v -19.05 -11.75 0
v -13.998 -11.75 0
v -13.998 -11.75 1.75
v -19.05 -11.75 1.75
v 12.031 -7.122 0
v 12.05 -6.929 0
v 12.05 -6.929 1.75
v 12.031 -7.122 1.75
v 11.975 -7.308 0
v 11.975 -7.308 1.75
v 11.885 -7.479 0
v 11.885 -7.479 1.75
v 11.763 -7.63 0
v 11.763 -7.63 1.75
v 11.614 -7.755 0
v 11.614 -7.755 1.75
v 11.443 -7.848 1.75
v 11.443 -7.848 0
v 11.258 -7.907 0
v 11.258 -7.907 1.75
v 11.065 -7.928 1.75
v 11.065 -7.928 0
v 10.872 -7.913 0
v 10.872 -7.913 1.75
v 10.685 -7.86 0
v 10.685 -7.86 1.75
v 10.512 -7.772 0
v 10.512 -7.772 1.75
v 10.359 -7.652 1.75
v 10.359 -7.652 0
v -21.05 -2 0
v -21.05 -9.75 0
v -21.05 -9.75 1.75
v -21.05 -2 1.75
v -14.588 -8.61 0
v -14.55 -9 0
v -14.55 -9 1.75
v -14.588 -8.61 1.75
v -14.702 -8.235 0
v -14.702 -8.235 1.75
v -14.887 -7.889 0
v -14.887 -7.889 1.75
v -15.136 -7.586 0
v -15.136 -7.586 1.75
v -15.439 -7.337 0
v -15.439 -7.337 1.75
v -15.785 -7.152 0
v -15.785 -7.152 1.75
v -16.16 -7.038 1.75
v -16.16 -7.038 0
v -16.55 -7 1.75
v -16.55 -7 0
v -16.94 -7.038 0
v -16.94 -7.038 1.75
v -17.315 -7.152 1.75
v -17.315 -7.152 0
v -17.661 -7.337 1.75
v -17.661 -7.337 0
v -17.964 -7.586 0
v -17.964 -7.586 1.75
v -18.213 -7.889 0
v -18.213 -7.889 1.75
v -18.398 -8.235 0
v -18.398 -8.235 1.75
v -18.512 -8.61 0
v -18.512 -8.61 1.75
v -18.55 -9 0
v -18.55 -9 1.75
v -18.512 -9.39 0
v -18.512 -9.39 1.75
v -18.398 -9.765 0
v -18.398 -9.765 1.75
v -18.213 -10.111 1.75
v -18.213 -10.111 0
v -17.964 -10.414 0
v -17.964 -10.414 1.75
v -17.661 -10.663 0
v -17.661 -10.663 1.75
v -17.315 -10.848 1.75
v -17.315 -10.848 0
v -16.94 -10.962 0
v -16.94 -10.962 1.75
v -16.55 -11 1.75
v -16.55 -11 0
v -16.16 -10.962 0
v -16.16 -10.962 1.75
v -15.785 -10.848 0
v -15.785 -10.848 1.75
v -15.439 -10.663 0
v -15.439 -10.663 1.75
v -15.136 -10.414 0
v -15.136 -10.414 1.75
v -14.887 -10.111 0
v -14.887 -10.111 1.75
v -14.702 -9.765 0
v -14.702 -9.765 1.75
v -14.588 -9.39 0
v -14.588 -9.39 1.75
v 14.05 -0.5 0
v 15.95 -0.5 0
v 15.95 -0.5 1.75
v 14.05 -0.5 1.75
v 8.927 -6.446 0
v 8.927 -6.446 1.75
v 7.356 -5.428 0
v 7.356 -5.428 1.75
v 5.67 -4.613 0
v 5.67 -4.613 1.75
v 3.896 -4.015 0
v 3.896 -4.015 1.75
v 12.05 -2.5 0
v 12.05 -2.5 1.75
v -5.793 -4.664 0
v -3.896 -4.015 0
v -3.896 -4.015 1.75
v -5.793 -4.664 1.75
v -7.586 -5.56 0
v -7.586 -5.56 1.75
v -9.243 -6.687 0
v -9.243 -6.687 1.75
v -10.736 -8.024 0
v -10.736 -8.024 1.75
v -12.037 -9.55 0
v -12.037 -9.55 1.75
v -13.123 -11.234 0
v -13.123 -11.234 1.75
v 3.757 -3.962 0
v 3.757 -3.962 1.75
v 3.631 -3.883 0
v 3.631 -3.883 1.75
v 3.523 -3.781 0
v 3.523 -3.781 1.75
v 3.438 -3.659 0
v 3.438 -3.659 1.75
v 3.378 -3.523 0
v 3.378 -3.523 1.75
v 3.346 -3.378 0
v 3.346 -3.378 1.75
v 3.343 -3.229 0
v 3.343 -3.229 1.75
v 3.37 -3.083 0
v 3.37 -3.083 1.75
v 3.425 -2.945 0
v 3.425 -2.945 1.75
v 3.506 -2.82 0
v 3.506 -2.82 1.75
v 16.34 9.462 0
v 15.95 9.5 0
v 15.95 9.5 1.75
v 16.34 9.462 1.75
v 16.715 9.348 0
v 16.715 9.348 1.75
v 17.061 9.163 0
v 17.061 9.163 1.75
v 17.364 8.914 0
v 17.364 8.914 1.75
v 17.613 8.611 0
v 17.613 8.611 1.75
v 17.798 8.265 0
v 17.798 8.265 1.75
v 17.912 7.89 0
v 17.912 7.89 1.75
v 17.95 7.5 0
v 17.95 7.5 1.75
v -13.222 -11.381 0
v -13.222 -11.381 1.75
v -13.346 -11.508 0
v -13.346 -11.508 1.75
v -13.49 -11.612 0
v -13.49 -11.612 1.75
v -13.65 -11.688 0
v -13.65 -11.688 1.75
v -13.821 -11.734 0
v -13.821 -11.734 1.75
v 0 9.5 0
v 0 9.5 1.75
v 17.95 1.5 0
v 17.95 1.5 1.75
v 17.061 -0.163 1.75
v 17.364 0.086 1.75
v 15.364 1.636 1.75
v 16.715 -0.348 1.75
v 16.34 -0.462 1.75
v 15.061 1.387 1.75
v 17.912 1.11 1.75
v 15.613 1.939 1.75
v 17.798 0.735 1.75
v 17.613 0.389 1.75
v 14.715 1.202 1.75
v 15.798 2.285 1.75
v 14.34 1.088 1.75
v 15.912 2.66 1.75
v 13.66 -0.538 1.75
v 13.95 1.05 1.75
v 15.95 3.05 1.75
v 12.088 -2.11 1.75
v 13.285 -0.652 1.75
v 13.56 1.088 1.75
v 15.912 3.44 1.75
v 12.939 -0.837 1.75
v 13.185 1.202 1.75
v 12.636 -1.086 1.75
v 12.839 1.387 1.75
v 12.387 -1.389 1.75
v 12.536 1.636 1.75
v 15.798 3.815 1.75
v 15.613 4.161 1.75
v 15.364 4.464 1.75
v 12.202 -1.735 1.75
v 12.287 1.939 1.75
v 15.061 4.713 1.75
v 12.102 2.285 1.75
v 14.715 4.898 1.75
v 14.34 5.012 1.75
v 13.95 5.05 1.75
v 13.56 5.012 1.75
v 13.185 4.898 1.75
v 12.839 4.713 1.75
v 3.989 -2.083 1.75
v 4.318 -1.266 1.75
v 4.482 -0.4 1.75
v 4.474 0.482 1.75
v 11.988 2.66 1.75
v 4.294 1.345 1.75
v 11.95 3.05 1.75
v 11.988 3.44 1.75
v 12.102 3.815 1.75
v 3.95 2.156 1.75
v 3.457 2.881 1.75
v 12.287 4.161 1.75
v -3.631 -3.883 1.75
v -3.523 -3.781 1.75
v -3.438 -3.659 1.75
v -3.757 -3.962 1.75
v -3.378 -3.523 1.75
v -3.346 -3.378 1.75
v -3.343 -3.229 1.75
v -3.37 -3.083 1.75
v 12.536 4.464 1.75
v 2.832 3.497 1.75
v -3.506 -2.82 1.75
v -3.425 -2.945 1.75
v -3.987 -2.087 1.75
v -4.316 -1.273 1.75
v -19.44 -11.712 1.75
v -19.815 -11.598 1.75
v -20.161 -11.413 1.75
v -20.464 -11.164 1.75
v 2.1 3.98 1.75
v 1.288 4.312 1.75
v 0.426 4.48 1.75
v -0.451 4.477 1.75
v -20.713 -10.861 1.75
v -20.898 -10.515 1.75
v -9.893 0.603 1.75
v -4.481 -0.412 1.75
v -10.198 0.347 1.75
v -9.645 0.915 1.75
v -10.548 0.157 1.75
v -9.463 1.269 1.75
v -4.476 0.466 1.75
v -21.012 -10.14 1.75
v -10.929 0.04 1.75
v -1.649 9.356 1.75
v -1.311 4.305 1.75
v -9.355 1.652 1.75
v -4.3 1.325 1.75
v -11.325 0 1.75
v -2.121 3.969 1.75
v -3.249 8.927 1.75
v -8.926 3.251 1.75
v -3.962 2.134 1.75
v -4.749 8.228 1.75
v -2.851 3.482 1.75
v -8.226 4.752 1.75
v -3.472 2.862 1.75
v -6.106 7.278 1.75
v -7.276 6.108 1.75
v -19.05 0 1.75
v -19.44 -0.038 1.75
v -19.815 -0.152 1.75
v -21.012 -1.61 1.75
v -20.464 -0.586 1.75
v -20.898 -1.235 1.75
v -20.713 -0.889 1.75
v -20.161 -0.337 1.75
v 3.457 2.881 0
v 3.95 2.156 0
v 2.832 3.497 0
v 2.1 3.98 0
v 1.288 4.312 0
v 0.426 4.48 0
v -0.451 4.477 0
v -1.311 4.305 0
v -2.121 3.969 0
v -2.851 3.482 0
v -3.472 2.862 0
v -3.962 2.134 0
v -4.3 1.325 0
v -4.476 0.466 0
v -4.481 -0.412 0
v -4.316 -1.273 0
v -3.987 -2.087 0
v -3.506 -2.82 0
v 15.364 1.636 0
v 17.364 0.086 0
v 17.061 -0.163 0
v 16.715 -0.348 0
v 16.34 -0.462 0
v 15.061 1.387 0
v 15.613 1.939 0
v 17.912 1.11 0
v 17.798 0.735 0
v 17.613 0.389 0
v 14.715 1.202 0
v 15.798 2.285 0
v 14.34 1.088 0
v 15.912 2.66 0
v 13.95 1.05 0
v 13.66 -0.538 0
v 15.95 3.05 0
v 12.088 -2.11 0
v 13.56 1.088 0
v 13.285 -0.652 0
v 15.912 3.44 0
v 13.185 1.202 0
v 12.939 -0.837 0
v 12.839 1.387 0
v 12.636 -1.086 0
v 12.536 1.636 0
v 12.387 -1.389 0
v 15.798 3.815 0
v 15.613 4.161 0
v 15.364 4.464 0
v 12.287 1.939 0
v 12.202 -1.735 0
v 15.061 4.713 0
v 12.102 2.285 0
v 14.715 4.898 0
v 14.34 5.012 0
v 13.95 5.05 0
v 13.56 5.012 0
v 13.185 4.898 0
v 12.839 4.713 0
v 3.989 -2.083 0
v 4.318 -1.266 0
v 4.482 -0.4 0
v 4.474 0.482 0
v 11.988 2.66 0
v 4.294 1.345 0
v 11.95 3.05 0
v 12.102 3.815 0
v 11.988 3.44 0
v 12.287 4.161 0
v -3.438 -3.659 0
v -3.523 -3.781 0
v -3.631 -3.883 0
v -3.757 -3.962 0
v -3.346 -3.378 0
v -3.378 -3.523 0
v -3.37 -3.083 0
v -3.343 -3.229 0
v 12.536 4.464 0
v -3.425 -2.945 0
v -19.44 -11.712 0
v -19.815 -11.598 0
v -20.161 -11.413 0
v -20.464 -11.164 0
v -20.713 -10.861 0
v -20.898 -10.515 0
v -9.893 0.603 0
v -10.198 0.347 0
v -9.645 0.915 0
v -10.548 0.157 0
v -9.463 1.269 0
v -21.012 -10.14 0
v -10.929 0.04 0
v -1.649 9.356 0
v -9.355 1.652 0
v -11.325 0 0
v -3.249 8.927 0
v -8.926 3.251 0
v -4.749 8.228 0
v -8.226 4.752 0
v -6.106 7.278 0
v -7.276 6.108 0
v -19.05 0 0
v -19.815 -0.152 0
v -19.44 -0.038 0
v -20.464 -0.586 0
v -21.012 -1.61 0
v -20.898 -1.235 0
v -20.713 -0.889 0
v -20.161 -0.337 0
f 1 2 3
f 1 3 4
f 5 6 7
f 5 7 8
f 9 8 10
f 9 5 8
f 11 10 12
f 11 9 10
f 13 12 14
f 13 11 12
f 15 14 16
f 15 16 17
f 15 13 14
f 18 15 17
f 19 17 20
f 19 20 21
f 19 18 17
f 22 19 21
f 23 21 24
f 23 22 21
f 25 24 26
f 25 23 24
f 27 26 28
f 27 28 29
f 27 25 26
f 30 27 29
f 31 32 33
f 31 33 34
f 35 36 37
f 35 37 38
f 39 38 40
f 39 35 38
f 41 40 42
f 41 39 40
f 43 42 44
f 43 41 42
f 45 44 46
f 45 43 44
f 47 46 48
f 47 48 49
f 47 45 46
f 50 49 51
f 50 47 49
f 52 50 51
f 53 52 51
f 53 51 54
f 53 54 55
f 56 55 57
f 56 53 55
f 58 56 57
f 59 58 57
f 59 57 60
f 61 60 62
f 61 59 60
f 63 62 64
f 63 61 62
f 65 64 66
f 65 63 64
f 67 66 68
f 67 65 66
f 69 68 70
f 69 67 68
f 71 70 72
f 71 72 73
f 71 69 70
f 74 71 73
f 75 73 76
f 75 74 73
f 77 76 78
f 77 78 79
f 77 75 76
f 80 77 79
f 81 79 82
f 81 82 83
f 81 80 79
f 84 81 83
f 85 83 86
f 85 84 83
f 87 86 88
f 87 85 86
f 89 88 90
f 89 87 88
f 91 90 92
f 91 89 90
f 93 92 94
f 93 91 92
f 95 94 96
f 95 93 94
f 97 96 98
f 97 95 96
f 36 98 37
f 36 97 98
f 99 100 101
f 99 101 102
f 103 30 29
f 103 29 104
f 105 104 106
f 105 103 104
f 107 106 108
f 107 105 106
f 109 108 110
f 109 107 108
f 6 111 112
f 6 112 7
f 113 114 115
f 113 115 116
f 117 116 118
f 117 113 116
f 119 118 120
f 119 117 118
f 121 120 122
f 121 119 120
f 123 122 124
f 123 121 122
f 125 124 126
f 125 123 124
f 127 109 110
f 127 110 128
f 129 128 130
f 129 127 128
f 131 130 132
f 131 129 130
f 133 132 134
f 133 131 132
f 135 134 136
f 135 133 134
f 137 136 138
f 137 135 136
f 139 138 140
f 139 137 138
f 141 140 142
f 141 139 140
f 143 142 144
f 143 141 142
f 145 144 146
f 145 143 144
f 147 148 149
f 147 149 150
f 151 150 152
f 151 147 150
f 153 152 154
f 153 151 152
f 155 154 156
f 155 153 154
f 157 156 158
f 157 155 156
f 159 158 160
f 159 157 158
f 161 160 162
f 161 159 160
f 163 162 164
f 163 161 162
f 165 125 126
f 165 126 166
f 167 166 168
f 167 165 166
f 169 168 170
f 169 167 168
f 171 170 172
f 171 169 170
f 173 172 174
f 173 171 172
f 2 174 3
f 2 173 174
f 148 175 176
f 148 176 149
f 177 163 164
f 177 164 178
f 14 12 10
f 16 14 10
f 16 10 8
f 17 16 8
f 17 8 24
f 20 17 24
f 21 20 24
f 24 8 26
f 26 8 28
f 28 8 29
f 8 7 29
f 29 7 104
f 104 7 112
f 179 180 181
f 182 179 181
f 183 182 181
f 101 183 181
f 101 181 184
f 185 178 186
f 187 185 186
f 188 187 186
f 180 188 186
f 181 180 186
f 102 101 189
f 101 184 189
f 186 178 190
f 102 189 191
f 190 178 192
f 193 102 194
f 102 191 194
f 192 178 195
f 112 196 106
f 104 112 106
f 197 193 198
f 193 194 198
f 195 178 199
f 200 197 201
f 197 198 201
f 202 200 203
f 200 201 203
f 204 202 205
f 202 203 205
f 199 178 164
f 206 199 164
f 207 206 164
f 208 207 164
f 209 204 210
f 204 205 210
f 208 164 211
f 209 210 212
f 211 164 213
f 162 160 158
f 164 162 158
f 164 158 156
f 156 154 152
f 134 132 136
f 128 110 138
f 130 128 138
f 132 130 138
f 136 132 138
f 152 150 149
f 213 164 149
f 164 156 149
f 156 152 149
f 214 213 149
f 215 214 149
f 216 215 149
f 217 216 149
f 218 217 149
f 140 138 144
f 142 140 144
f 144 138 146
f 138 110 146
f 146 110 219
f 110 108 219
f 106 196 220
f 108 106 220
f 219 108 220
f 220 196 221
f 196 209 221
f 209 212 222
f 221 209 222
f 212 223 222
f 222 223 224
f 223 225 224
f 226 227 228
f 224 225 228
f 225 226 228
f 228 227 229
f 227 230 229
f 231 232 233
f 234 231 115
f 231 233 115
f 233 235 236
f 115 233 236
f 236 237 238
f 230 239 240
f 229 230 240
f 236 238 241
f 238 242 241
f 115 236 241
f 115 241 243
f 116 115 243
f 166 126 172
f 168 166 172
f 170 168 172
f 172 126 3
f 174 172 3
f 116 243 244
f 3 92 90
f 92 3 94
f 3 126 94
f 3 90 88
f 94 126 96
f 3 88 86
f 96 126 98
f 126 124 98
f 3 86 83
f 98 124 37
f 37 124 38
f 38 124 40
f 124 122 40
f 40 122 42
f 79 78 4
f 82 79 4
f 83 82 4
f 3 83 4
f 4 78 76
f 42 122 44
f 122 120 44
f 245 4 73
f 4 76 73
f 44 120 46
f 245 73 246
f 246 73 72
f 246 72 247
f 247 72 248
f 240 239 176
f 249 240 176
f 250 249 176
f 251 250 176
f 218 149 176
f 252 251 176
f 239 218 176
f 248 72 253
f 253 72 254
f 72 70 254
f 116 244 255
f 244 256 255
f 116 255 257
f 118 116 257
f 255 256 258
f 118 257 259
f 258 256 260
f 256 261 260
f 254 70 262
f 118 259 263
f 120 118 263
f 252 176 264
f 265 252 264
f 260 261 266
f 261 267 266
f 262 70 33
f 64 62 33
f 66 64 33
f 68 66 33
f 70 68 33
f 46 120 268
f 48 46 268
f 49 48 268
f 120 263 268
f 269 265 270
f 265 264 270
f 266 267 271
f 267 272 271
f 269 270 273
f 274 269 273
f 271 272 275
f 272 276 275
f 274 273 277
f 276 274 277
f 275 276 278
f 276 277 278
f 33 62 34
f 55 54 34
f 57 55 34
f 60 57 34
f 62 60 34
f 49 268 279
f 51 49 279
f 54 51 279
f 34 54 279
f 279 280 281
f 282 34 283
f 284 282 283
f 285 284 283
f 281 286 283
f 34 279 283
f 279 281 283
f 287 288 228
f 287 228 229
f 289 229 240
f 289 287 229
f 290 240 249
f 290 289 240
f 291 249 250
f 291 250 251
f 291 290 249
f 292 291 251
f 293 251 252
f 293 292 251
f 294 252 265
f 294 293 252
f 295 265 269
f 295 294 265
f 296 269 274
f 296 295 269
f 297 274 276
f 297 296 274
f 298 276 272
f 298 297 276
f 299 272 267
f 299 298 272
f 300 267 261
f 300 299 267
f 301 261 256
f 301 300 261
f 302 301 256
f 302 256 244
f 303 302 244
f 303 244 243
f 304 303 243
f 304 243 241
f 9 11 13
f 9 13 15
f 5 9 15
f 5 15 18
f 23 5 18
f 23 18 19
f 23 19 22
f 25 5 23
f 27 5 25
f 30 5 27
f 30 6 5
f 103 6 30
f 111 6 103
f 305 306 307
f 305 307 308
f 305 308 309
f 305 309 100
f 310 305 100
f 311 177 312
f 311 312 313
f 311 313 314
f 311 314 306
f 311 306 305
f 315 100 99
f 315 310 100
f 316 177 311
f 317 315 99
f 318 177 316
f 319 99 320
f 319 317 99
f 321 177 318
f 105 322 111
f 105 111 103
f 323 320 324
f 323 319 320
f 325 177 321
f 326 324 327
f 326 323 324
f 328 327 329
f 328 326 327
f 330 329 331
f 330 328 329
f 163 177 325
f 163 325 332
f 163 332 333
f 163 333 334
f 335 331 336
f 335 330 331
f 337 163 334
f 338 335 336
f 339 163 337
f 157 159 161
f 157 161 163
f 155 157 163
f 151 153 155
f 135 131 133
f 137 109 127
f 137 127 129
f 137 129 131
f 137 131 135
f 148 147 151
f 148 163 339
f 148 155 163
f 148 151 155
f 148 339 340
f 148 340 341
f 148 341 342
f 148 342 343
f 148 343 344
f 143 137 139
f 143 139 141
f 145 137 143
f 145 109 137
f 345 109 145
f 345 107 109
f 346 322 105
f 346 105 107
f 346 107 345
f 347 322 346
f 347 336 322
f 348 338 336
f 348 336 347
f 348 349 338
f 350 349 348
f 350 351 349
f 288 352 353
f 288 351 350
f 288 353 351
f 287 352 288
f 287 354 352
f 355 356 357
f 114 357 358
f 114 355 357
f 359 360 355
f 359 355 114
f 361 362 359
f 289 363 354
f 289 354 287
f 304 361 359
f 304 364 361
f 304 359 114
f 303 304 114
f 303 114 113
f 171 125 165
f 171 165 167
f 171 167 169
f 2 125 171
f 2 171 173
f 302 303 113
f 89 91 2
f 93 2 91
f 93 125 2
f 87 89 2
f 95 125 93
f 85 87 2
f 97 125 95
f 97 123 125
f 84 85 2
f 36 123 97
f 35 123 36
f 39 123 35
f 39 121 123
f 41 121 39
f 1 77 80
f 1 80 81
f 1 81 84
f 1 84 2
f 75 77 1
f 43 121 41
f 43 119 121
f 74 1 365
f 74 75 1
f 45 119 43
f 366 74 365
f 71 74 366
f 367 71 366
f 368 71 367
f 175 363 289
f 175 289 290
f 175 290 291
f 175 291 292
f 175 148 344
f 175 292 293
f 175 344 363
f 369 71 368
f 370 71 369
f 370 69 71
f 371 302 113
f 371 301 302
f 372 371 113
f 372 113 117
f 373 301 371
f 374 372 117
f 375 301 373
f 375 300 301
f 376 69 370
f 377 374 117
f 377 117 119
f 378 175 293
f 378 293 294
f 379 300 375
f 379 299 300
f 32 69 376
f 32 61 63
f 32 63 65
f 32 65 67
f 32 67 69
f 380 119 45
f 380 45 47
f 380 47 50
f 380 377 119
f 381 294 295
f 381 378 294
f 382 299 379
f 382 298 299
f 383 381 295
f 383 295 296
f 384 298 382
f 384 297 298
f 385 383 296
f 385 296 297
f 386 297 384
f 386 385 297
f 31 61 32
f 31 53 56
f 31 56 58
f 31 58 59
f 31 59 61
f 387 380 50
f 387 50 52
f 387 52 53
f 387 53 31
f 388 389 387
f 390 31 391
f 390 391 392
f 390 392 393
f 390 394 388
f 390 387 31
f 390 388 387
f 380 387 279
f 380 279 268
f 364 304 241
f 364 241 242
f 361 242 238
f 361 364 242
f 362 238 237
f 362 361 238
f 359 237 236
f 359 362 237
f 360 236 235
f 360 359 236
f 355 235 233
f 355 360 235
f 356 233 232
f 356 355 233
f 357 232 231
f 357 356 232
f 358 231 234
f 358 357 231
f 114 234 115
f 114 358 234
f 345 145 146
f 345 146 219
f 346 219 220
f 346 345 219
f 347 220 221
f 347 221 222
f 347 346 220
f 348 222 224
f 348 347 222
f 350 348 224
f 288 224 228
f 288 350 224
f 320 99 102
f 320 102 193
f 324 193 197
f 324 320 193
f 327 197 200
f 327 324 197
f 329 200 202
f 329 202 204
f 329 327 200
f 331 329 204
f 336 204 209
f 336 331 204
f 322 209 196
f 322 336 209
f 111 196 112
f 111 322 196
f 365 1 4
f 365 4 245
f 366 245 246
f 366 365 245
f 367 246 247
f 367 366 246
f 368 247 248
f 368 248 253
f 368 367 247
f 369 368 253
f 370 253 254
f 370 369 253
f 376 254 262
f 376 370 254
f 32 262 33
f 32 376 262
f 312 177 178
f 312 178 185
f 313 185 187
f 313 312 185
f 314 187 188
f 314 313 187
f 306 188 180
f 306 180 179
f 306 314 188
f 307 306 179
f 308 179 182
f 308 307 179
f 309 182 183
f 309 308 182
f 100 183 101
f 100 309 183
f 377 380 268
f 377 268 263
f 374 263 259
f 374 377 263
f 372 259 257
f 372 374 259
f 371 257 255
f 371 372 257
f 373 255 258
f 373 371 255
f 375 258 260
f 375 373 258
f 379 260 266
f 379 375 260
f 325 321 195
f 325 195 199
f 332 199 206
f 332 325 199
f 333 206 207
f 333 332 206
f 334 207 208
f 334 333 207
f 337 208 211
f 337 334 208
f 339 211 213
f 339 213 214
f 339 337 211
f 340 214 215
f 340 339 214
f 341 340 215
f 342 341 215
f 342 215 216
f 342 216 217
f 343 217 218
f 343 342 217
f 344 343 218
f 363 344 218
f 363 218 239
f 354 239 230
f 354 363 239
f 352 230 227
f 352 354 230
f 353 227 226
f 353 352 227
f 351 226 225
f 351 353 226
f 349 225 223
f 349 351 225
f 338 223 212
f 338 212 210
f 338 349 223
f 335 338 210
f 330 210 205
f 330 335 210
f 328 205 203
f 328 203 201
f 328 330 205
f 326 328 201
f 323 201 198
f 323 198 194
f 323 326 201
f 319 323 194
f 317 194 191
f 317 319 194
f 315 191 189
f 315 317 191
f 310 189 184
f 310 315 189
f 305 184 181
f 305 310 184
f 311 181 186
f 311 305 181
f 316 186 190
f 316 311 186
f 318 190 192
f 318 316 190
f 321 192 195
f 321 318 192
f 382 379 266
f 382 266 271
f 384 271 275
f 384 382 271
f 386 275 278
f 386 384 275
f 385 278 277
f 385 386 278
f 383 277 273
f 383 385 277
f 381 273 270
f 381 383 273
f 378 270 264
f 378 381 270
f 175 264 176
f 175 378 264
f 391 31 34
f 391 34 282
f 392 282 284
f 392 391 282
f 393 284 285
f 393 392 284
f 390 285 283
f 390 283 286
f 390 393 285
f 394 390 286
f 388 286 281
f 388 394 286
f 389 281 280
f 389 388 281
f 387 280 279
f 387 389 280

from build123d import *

# Parameters (mm, degrees)
SKETCH1_R           = 2
BOSS_EXTRUDE2_DEPTH = 1.75


with BuildPart() as part:
    # Sketch1 → Boss-Extrude2 (new body)
    with BuildSketch(Plane.XY):
        with BuildLine():
            Line((0, 9.5), (15.95, 9.5))
            ThreePointArc((15.95, 9.5), (17.364213562, 8.914213562), (17.95, 7.5))
            Line((17.95, 7.5), (17.95, 1.5))
            ThreePointArc((17.95, 1.5), (17.364213562, 0.085786438), (15.95, -0.5))
            Line((15.95, -0.5), (14.05, -0.5))
            ThreePointArc((14.05, -0.5), (12.635786438, -1.085786438), (12.05, -2.5))
            Line((12.05, -2.5), (12.05, -2.621320344))
            Line((12.05, -2.621320344), (12.05, -6.92859127))
            ThreePointArc((12.05, -6.92859127), (11.443303318, -7.848000047), (10.359375, -7.651804315))
            ThreePointArc((10.359375, -7.651804315), (7.356020854, -5.427549686), (3.896023084, -4.014800515))
            ThreePointArc((3.896023084, -4.014800515), (3.377802295, -3.523133979), (3.506420776, -2.82046332))
            ThreePointArc((3.506420776, -2.82046332), (4.482227913, -0.399540902), (3.95, 2.155806114))
            ThreePointArc((3.95, 2.155806114), (-2.498000201, 3.742992786), (-3.506420776, -2.82046332))
            ThreePointArc((-3.506420776, -2.82046332), (-3.377802295, -3.523133979), (-3.896023084, -4.014800515))
            ThreePointArc((-3.896023084, -4.014800515), (-9.243460442, -6.686514525), (-13.122907199, -11.234375))
            ThreePointArc((-13.122907199, -11.234375), (-13.490015279, -11.611503047), (-13.997767679, -11.75))
            Line((-13.997767679, -11.75), (-19.05, -11.75))
            ThreePointArc((-19.05, -11.75), (-20.464213562, -11.164213562), (-21.05, -9.75))
            Line((-21.05, -9.75), (-21.05, -2))
            ThreePointArc((-21.05, -2), (-20.464213562, -0.585786438), (-19.05, 0))
            Line((-19.05, 0), (-11.324751653, 0))
            ThreePointArc((-11.324751653, 0), (-10.039382479, 0.467738245), (-9.355229626, 1.652173913))
            ThreePointArc((-9.355229626, 1.652173913), (-6.105503576, 7.278243338), (0, 9.5))
        make_face()
        with Locations((-16.55, -9)):
            Circle(SKETCH1_R, mode=Mode.SUBTRACT)
        with Locations((13.95, 3.05)):
            Circle(SKETCH1_R, mode=Mode.SUBTRACT)
    extrude(amount=BOSS_EXTRUDE2_DEPTH)


solid = part.part
